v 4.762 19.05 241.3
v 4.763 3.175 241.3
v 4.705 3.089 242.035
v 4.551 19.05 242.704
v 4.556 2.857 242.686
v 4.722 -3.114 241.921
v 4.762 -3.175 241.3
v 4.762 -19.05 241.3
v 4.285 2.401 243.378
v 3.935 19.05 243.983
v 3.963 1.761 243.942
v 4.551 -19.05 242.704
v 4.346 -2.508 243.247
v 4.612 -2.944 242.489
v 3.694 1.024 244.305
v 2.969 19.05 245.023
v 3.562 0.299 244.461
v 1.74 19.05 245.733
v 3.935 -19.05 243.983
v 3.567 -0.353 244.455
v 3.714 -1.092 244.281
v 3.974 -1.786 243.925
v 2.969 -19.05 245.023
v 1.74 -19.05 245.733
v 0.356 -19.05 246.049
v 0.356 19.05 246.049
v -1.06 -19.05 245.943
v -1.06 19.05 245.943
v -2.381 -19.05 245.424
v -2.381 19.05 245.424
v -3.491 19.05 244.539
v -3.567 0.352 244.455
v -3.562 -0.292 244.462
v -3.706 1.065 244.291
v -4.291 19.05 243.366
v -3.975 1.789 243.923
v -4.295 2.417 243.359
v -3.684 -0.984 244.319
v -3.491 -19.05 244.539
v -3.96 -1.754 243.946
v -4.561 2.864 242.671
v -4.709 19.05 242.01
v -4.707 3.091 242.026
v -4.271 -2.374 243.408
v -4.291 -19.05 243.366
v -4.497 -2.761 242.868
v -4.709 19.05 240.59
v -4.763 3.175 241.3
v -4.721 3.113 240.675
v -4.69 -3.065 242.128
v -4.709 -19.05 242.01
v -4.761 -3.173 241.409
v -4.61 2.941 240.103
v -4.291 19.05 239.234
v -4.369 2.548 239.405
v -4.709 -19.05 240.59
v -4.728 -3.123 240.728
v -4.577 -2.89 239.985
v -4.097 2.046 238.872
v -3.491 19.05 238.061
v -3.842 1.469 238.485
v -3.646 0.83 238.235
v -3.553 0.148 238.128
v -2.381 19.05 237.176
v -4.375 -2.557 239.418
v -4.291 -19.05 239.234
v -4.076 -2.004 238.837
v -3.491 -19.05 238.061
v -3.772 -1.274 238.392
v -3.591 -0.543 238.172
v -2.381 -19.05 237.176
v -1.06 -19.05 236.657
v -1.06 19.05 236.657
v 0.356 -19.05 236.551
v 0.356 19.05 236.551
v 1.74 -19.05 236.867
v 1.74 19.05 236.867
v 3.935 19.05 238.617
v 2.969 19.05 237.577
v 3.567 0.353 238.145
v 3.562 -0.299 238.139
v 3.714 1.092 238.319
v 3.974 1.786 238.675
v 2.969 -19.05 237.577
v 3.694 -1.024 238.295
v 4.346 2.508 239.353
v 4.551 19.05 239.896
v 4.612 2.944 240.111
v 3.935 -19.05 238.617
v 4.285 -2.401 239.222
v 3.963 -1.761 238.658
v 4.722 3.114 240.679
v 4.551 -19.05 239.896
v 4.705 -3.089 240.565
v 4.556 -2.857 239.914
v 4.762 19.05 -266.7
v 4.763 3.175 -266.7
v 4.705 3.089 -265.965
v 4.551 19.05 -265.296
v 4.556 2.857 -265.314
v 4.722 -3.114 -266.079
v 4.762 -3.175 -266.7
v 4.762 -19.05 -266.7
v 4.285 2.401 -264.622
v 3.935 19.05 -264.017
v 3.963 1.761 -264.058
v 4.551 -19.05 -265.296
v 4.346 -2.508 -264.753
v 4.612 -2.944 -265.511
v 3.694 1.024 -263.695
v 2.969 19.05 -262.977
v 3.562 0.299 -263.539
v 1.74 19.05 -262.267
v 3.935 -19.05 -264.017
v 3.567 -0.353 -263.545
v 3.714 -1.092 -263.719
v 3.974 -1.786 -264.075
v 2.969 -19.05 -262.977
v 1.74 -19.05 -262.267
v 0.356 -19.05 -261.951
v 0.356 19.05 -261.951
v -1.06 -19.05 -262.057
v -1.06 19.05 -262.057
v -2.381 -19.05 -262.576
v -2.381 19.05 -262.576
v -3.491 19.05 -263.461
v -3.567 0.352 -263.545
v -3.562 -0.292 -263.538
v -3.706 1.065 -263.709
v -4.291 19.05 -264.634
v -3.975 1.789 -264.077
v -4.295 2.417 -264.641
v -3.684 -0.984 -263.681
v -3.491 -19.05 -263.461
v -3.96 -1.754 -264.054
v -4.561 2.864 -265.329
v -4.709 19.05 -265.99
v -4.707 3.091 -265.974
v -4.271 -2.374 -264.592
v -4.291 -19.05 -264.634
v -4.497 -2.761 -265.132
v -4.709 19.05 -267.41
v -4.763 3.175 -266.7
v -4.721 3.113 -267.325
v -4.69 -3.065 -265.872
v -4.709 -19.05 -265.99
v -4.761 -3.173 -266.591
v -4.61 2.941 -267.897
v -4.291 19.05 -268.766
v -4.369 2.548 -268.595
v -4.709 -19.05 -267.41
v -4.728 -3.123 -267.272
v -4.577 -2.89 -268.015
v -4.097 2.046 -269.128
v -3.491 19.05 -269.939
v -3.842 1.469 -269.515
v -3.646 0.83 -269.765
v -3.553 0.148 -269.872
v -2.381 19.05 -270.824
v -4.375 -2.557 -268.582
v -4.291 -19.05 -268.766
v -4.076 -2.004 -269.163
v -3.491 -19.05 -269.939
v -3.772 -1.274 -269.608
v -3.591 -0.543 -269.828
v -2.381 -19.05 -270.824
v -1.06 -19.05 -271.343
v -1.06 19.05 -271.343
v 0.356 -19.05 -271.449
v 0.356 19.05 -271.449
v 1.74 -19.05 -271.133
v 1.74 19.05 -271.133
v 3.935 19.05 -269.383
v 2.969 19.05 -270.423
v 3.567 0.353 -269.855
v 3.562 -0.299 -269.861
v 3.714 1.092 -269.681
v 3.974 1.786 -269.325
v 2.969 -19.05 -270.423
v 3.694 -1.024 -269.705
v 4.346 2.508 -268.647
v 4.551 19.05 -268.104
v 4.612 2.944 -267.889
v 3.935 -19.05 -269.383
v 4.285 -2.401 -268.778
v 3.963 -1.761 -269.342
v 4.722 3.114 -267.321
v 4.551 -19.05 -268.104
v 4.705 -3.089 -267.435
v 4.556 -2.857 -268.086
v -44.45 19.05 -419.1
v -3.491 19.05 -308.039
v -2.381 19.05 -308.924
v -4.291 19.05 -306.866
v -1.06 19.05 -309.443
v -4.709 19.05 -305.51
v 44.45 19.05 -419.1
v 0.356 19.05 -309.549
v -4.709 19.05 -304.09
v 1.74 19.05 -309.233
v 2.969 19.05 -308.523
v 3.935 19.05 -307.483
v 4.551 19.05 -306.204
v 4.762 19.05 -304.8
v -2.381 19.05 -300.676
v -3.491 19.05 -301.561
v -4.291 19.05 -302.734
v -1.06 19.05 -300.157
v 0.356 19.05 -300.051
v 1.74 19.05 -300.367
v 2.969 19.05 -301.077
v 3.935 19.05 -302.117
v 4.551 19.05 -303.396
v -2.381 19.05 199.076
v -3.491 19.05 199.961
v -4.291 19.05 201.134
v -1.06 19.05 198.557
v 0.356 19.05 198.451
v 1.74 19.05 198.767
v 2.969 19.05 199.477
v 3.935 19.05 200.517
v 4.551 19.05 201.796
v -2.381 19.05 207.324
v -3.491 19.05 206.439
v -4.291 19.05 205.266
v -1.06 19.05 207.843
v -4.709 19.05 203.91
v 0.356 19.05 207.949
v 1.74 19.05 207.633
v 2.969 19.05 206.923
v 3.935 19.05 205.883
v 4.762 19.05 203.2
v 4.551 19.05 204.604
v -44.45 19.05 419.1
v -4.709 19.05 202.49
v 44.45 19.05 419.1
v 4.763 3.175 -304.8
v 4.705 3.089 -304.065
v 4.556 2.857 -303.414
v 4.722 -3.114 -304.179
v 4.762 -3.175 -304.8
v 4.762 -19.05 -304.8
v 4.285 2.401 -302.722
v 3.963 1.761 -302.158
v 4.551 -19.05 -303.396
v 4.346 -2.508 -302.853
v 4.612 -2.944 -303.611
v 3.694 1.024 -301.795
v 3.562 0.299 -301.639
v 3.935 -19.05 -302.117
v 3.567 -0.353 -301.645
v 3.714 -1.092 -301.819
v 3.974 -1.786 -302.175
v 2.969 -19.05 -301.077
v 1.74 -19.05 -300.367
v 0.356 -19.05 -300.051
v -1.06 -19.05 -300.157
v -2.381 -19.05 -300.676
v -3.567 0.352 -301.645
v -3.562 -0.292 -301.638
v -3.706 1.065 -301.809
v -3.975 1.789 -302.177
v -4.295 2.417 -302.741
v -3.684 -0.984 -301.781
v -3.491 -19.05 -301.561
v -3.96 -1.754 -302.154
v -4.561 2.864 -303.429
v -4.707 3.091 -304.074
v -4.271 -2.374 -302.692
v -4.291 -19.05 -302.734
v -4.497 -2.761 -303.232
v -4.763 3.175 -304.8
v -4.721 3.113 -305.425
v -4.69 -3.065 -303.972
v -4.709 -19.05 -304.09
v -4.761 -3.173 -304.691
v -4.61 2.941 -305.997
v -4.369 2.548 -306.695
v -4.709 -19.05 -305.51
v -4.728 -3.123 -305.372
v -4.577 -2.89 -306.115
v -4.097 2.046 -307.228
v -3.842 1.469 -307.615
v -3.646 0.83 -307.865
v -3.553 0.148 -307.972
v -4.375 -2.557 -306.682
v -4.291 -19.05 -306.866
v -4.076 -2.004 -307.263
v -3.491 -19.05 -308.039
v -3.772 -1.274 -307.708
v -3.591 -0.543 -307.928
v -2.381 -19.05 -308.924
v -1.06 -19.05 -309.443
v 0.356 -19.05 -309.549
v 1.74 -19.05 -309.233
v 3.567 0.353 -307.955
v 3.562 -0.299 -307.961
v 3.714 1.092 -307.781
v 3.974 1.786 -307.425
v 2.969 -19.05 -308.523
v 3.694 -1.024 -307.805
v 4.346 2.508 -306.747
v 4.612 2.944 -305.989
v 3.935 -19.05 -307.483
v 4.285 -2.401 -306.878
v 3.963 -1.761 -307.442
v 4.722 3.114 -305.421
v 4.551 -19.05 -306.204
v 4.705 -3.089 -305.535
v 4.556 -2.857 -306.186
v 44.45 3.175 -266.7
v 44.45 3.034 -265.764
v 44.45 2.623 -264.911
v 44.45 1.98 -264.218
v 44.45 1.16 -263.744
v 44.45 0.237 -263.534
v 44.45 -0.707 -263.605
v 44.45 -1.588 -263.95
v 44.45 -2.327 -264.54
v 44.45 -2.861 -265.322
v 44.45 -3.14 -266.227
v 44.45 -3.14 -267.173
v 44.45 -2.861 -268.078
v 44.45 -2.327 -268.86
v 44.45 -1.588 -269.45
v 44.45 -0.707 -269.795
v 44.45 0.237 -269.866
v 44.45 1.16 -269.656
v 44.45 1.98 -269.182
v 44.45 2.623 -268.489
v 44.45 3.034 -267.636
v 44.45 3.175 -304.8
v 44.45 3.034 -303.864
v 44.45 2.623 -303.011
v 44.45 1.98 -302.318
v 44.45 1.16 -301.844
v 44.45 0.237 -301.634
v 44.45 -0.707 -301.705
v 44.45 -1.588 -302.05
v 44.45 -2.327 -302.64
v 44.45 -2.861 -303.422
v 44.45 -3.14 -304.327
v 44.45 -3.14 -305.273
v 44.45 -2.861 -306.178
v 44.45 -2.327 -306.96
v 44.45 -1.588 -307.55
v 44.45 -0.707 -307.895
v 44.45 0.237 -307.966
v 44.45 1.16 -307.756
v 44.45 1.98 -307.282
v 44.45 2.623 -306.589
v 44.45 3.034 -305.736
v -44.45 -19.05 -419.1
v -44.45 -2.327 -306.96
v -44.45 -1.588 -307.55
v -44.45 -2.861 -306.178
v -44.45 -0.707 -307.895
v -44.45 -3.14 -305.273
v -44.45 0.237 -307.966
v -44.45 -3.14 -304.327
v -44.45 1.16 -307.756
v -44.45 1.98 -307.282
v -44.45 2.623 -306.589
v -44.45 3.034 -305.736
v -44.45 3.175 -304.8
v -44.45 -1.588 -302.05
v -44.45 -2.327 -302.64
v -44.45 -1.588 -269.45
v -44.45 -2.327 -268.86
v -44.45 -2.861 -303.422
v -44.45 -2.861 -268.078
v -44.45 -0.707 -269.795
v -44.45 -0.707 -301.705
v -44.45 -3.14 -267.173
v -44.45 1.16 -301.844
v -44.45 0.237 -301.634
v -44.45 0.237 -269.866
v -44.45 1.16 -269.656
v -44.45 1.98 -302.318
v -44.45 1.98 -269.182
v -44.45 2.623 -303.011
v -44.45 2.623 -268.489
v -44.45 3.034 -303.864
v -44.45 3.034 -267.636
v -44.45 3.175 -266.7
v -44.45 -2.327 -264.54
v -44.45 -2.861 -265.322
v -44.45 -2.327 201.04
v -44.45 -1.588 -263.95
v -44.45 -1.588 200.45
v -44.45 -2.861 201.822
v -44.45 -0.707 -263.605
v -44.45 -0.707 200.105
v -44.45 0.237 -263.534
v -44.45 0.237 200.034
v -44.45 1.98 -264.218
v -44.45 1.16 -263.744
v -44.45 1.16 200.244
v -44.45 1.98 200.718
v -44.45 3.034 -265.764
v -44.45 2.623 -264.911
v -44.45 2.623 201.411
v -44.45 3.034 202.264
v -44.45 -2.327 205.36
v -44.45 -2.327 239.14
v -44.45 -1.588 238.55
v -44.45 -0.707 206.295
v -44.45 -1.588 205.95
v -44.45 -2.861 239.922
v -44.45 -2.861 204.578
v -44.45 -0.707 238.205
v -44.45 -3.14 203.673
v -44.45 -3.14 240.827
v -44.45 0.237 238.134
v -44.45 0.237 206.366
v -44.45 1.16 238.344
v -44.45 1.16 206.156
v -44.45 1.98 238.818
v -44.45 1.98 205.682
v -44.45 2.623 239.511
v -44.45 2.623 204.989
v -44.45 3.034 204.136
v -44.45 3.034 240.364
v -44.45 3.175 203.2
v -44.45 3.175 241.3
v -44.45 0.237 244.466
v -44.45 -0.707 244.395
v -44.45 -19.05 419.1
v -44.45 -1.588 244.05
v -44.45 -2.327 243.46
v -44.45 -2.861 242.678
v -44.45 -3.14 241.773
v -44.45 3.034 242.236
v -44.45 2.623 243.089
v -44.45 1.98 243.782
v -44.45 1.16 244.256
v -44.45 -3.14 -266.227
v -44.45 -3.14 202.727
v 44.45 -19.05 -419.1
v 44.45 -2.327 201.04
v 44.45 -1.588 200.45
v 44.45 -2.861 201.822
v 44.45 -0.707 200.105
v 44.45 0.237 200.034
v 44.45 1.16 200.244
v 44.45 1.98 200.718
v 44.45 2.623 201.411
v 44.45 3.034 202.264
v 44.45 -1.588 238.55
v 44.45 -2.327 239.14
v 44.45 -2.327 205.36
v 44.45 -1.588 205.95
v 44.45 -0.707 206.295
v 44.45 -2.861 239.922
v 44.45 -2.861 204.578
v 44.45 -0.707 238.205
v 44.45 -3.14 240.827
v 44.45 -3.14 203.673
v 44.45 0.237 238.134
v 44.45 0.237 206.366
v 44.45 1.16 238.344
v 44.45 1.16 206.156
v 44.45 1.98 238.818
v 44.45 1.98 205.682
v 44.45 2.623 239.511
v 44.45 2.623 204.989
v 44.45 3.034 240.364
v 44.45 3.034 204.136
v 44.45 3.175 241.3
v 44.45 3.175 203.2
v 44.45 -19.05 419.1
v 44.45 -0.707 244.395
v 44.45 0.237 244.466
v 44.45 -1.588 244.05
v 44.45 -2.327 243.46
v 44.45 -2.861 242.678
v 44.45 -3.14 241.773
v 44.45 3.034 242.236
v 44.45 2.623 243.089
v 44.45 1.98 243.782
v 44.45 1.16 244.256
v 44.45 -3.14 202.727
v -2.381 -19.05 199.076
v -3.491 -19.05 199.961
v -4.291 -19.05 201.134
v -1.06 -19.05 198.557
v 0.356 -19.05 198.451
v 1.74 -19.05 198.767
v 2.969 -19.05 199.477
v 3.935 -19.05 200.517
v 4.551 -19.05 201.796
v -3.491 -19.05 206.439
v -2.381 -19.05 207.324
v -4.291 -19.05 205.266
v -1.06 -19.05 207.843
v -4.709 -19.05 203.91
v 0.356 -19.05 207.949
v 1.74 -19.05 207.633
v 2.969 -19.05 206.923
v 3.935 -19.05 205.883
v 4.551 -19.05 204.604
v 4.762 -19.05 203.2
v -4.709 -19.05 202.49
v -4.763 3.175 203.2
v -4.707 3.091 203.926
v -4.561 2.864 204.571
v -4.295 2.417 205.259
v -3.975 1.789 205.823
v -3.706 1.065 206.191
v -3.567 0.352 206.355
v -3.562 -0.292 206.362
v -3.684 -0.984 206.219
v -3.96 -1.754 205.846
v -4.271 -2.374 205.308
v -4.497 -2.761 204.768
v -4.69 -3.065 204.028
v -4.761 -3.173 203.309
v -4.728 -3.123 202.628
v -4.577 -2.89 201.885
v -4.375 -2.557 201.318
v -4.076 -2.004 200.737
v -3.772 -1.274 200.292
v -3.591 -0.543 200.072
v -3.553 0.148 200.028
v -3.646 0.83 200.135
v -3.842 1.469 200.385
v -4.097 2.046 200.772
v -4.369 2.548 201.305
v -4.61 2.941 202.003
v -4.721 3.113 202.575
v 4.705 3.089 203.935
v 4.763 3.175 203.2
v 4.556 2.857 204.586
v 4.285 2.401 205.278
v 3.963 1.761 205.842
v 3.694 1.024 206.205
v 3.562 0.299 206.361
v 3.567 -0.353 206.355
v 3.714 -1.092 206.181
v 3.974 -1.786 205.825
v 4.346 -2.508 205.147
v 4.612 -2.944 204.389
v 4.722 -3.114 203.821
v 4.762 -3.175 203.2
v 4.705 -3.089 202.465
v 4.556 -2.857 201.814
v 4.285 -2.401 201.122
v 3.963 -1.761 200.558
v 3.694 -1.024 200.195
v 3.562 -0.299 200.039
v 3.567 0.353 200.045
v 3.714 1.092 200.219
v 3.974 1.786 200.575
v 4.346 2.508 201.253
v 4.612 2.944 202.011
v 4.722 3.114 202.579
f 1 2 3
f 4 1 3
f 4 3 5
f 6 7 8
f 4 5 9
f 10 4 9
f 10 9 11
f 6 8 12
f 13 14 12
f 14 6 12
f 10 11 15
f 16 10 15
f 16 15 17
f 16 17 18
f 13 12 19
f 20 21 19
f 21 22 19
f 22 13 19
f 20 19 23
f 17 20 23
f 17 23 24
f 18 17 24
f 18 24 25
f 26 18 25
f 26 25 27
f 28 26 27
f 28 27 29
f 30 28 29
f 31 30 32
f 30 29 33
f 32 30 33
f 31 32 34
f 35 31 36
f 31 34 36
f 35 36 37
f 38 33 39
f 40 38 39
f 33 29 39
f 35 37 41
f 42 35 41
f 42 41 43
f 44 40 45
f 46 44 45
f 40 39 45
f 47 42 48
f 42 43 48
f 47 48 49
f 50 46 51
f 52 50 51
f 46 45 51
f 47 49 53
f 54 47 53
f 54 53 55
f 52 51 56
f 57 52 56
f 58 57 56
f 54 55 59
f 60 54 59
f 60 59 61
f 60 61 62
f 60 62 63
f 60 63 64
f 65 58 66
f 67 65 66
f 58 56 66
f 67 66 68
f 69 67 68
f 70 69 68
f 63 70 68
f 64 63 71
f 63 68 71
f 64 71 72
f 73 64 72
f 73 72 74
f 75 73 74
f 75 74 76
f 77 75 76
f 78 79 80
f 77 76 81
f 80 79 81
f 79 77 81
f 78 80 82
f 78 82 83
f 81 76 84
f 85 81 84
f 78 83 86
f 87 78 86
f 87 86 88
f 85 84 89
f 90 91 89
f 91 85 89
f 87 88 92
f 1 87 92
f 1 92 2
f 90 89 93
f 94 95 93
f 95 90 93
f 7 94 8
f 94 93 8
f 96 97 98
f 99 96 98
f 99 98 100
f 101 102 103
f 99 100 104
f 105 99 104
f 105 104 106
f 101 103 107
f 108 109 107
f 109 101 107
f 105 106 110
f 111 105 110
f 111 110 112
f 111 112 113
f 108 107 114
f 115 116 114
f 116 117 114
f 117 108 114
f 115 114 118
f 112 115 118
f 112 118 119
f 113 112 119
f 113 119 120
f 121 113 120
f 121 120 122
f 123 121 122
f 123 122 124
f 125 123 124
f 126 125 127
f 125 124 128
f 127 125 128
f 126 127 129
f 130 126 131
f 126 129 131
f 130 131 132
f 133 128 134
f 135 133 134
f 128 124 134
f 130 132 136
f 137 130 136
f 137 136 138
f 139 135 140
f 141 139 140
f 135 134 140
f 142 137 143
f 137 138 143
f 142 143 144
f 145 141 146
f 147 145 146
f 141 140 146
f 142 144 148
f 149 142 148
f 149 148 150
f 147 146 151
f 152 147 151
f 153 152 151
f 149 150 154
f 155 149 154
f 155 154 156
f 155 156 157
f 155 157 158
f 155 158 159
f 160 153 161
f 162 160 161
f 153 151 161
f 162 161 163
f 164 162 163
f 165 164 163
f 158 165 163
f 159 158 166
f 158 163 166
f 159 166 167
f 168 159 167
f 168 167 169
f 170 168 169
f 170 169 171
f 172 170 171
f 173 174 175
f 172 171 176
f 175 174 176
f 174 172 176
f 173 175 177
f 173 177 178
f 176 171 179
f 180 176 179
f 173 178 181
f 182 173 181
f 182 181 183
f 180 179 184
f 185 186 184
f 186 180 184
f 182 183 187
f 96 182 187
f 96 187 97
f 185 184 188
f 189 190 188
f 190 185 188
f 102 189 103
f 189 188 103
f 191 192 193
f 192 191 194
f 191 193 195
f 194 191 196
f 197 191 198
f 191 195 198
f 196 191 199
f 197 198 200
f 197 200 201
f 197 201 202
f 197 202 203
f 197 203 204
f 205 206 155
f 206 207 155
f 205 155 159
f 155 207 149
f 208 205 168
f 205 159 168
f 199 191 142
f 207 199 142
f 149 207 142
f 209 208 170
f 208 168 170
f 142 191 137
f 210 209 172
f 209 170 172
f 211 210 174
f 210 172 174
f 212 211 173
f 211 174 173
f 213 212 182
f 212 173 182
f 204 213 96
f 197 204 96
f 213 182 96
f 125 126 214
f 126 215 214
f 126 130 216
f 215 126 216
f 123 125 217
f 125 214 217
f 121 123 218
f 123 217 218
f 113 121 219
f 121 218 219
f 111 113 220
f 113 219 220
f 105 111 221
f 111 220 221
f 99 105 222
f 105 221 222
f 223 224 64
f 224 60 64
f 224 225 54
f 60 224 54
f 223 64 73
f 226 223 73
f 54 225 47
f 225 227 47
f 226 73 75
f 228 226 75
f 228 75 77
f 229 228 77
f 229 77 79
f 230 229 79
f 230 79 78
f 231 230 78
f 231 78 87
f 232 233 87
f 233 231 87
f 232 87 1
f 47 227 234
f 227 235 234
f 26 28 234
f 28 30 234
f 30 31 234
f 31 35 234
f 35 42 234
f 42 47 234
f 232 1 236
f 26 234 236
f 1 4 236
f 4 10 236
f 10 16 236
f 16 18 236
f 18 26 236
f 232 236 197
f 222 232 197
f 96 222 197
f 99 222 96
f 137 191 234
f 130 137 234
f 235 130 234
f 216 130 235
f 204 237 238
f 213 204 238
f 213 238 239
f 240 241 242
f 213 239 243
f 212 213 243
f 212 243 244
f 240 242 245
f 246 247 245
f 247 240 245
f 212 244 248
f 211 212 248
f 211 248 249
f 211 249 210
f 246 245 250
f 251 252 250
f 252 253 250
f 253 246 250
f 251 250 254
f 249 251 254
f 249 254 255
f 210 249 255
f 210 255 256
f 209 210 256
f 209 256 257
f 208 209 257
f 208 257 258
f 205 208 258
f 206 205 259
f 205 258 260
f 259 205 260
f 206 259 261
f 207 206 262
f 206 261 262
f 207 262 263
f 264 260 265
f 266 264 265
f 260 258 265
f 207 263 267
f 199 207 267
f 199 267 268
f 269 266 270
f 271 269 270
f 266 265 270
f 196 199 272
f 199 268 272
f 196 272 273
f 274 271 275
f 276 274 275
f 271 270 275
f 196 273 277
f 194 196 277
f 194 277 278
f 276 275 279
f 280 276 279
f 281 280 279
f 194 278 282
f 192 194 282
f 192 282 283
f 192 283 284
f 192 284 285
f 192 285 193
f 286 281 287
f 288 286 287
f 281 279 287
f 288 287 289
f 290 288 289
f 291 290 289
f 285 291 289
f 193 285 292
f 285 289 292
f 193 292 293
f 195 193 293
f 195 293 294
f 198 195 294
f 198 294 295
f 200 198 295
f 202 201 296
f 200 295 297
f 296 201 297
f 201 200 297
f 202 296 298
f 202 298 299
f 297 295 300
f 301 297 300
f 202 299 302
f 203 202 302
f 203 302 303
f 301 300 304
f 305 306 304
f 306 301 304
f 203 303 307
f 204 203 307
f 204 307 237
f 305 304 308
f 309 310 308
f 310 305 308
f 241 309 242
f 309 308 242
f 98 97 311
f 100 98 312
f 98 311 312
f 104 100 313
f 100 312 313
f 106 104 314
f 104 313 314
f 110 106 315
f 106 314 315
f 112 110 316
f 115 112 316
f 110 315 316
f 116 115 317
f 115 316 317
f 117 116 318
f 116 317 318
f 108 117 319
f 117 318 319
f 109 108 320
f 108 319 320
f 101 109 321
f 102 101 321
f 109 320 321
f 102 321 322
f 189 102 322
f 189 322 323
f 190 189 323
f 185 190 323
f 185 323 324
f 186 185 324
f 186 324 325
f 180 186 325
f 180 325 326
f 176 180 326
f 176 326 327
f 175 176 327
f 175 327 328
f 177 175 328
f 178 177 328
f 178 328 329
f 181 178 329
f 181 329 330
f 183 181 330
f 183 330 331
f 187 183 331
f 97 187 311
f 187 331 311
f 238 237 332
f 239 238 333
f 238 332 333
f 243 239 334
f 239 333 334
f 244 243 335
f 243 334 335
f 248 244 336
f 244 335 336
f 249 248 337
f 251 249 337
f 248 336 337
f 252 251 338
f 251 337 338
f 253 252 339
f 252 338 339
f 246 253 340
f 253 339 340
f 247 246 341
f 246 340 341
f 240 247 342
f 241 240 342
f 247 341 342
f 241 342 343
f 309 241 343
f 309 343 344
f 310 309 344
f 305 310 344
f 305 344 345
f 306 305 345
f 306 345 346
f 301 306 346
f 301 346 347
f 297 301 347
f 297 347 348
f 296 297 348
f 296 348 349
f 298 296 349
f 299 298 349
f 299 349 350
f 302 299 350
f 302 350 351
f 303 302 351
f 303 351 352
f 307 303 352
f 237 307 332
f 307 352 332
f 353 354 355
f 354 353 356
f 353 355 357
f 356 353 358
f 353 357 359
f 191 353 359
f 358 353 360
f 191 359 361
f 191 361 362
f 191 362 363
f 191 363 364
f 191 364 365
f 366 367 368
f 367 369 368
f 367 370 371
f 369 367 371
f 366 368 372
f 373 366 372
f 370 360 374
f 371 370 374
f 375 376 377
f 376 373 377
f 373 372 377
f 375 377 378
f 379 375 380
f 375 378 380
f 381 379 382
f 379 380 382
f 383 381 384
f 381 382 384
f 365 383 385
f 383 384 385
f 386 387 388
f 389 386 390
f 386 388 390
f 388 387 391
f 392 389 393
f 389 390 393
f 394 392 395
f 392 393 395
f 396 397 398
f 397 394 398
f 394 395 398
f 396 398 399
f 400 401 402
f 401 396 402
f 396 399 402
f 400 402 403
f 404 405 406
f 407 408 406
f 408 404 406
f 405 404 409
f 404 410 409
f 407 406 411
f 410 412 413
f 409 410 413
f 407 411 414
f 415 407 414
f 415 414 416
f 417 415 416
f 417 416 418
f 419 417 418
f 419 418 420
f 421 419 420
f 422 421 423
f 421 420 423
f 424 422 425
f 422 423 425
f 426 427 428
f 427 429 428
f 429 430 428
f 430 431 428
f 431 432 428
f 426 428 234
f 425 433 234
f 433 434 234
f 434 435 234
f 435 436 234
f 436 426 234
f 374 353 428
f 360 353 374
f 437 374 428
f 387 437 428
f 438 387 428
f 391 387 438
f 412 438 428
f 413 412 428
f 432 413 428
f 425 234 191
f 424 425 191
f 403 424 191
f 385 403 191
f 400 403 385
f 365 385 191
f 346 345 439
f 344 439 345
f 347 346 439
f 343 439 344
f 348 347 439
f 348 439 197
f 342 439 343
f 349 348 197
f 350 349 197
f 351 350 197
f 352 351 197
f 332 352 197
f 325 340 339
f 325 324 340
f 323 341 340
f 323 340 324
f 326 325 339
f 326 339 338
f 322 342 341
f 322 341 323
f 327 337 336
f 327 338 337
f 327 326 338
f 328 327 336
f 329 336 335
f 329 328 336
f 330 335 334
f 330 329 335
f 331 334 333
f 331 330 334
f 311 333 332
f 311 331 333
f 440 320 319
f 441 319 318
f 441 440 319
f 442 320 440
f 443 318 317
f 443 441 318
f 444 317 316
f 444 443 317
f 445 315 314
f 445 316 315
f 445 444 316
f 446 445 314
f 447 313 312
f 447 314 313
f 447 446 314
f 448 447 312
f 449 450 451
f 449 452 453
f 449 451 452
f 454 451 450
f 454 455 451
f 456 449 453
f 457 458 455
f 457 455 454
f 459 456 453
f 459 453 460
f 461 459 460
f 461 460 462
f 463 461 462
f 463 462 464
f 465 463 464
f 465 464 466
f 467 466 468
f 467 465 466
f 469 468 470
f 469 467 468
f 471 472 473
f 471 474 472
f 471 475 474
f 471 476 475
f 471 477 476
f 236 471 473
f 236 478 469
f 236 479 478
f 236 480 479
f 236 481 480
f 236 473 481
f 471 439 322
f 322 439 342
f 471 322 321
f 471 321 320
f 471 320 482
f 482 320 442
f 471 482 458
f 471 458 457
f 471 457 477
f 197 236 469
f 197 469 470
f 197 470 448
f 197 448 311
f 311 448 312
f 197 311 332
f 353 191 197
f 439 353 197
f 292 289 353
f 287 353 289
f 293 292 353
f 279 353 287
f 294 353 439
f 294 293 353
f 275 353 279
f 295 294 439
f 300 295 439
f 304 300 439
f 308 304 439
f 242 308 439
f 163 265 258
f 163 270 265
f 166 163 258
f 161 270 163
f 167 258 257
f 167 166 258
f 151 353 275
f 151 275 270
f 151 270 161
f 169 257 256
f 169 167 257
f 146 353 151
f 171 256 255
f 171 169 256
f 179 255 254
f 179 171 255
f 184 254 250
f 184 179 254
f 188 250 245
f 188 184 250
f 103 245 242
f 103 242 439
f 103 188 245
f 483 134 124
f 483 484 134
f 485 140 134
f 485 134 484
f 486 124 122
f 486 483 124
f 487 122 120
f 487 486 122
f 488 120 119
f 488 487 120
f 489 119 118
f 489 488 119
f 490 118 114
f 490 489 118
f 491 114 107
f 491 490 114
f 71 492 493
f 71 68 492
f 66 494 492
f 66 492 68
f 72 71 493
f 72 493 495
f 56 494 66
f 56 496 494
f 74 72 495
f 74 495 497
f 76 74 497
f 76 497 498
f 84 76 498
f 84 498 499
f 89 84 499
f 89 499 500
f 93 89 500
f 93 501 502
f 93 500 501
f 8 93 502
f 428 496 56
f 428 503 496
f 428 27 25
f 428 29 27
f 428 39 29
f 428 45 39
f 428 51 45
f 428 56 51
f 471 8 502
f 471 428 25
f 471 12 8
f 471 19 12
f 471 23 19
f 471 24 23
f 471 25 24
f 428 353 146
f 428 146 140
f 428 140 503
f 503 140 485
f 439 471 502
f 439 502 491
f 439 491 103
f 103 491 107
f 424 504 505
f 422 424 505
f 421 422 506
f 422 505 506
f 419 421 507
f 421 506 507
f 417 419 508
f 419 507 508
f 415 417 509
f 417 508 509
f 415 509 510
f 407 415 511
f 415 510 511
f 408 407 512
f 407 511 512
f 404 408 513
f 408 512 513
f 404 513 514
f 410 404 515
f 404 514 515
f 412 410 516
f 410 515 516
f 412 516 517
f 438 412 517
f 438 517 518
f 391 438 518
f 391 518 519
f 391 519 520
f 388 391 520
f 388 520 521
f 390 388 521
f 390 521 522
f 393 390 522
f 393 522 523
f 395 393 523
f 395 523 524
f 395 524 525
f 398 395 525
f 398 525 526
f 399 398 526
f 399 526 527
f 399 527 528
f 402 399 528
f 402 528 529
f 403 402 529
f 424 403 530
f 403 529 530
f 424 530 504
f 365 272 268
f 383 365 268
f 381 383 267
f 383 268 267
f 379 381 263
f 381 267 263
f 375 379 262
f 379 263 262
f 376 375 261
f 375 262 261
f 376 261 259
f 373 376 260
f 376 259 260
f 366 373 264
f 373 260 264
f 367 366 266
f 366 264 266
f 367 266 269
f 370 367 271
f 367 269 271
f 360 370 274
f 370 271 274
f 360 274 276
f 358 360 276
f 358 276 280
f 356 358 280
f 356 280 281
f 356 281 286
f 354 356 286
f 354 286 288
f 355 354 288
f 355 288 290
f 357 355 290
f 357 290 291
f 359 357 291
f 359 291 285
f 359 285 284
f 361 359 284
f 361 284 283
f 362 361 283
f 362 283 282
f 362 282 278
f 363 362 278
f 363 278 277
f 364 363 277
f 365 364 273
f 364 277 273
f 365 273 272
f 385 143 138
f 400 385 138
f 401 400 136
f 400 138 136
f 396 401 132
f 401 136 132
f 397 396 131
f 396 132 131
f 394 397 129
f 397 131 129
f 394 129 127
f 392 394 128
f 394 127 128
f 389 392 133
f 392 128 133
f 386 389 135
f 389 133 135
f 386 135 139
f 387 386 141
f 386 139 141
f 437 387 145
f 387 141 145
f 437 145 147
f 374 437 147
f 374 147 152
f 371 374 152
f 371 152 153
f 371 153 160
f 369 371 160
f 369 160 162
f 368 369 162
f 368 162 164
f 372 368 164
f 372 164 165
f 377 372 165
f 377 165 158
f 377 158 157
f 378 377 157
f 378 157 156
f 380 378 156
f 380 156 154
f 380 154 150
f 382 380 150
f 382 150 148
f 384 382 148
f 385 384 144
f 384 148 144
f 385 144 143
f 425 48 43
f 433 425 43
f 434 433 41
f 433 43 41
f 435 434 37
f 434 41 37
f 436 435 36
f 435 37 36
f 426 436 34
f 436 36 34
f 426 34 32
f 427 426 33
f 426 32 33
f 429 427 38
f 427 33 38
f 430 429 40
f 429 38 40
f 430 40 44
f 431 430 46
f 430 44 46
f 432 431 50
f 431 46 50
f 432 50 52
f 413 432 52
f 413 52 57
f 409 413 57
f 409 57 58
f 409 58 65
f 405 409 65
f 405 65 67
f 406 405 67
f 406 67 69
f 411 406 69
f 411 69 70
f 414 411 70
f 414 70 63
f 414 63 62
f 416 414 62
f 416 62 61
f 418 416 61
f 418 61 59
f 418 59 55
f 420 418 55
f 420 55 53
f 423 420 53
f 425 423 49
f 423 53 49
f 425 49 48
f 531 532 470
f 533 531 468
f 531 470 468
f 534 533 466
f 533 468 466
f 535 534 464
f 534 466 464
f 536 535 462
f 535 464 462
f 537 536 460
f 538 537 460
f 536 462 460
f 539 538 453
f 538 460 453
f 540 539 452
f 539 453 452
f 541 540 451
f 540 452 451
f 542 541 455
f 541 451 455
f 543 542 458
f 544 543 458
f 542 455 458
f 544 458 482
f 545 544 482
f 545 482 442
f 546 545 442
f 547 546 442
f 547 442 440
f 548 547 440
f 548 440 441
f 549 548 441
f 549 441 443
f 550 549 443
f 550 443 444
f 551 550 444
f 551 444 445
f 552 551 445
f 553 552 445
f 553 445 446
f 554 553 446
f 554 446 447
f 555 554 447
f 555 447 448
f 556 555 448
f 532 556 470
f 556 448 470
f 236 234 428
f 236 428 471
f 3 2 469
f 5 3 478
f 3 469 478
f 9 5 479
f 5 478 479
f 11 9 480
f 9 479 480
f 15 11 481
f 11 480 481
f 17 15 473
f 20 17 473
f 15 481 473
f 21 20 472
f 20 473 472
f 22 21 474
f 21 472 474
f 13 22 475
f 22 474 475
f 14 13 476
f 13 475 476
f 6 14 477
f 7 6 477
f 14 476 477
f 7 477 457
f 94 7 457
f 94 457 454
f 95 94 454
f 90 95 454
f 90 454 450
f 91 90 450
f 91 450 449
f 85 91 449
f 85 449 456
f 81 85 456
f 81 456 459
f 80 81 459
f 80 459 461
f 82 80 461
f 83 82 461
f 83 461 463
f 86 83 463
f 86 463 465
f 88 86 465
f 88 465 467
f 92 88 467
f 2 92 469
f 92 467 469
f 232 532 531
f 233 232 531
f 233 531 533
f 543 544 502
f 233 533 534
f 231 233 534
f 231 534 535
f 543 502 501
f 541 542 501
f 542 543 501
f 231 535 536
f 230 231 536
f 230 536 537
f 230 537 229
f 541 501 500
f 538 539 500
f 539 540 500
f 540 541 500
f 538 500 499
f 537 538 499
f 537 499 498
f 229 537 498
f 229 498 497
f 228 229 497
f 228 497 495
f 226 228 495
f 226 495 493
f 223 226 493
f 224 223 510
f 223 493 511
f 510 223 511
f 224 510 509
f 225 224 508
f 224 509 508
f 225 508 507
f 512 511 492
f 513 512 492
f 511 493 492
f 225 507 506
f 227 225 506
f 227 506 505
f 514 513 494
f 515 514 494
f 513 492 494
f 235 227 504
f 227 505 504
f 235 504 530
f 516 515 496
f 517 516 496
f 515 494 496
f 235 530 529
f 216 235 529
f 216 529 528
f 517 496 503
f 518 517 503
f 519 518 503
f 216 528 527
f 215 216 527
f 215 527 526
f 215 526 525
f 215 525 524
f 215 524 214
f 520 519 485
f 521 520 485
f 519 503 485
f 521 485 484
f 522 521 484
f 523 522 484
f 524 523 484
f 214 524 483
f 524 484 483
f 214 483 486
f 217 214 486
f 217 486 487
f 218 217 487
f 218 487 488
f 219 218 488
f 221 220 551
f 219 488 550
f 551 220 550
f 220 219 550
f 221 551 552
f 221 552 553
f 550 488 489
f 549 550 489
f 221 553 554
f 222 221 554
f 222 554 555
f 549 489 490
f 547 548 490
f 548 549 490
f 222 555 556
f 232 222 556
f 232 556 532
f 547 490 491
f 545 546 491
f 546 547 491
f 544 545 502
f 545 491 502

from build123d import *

# Parameters (mm, degrees)
F0_W     = 88.9
F0_H     = 38.1
F1_DEPTH = 419.1
F2_R     = 4.7625
F3_DEPTH = 38.101
F4_R     = 3.175
F5_DEPTH = 88.901


with BuildPart() as f1:
    # F0 (on Top) → F1 (new body, symmetric)
    with BuildSketch(Plane.XY):
        Rectangle(F0_W, F0_H)
    extrude(amount=F1_DEPTH, both=True)

    # F2 (on face) → F3 (cut, through all)
    with BuildSketch(Plane.XZ.offset(19.05)):
        with Locations((0, 241.3)):
            Circle(F2_R)
        with Locations((0, 203.2)):
            Circle(F2_R)
        with Locations((0, -266.7)):
            Circle(F2_R)
        with Locations((0, -304.8)):
            Circle(F2_R)
    extrude(amount=-F3_DEPTH, mode=Mode.SUBTRACT)

    # F4 (on face) → F5 (cut, through all)
    with BuildSketch(Plane.YZ.offset(44.45)):
        with Locations((0, 241.3)):
            Circle(F4_R)
        with Locations((0, 203.2)):
            Circle(F4_R)
        with Locations((0, -304.8)):
            Circle(F4_R)
        with Locations((0, -266.7)):
            Circle(F4_R)
    extrude(amount=-F5_DEPTH, mode=Mode.SUBTRACT)


solid = f1.part
